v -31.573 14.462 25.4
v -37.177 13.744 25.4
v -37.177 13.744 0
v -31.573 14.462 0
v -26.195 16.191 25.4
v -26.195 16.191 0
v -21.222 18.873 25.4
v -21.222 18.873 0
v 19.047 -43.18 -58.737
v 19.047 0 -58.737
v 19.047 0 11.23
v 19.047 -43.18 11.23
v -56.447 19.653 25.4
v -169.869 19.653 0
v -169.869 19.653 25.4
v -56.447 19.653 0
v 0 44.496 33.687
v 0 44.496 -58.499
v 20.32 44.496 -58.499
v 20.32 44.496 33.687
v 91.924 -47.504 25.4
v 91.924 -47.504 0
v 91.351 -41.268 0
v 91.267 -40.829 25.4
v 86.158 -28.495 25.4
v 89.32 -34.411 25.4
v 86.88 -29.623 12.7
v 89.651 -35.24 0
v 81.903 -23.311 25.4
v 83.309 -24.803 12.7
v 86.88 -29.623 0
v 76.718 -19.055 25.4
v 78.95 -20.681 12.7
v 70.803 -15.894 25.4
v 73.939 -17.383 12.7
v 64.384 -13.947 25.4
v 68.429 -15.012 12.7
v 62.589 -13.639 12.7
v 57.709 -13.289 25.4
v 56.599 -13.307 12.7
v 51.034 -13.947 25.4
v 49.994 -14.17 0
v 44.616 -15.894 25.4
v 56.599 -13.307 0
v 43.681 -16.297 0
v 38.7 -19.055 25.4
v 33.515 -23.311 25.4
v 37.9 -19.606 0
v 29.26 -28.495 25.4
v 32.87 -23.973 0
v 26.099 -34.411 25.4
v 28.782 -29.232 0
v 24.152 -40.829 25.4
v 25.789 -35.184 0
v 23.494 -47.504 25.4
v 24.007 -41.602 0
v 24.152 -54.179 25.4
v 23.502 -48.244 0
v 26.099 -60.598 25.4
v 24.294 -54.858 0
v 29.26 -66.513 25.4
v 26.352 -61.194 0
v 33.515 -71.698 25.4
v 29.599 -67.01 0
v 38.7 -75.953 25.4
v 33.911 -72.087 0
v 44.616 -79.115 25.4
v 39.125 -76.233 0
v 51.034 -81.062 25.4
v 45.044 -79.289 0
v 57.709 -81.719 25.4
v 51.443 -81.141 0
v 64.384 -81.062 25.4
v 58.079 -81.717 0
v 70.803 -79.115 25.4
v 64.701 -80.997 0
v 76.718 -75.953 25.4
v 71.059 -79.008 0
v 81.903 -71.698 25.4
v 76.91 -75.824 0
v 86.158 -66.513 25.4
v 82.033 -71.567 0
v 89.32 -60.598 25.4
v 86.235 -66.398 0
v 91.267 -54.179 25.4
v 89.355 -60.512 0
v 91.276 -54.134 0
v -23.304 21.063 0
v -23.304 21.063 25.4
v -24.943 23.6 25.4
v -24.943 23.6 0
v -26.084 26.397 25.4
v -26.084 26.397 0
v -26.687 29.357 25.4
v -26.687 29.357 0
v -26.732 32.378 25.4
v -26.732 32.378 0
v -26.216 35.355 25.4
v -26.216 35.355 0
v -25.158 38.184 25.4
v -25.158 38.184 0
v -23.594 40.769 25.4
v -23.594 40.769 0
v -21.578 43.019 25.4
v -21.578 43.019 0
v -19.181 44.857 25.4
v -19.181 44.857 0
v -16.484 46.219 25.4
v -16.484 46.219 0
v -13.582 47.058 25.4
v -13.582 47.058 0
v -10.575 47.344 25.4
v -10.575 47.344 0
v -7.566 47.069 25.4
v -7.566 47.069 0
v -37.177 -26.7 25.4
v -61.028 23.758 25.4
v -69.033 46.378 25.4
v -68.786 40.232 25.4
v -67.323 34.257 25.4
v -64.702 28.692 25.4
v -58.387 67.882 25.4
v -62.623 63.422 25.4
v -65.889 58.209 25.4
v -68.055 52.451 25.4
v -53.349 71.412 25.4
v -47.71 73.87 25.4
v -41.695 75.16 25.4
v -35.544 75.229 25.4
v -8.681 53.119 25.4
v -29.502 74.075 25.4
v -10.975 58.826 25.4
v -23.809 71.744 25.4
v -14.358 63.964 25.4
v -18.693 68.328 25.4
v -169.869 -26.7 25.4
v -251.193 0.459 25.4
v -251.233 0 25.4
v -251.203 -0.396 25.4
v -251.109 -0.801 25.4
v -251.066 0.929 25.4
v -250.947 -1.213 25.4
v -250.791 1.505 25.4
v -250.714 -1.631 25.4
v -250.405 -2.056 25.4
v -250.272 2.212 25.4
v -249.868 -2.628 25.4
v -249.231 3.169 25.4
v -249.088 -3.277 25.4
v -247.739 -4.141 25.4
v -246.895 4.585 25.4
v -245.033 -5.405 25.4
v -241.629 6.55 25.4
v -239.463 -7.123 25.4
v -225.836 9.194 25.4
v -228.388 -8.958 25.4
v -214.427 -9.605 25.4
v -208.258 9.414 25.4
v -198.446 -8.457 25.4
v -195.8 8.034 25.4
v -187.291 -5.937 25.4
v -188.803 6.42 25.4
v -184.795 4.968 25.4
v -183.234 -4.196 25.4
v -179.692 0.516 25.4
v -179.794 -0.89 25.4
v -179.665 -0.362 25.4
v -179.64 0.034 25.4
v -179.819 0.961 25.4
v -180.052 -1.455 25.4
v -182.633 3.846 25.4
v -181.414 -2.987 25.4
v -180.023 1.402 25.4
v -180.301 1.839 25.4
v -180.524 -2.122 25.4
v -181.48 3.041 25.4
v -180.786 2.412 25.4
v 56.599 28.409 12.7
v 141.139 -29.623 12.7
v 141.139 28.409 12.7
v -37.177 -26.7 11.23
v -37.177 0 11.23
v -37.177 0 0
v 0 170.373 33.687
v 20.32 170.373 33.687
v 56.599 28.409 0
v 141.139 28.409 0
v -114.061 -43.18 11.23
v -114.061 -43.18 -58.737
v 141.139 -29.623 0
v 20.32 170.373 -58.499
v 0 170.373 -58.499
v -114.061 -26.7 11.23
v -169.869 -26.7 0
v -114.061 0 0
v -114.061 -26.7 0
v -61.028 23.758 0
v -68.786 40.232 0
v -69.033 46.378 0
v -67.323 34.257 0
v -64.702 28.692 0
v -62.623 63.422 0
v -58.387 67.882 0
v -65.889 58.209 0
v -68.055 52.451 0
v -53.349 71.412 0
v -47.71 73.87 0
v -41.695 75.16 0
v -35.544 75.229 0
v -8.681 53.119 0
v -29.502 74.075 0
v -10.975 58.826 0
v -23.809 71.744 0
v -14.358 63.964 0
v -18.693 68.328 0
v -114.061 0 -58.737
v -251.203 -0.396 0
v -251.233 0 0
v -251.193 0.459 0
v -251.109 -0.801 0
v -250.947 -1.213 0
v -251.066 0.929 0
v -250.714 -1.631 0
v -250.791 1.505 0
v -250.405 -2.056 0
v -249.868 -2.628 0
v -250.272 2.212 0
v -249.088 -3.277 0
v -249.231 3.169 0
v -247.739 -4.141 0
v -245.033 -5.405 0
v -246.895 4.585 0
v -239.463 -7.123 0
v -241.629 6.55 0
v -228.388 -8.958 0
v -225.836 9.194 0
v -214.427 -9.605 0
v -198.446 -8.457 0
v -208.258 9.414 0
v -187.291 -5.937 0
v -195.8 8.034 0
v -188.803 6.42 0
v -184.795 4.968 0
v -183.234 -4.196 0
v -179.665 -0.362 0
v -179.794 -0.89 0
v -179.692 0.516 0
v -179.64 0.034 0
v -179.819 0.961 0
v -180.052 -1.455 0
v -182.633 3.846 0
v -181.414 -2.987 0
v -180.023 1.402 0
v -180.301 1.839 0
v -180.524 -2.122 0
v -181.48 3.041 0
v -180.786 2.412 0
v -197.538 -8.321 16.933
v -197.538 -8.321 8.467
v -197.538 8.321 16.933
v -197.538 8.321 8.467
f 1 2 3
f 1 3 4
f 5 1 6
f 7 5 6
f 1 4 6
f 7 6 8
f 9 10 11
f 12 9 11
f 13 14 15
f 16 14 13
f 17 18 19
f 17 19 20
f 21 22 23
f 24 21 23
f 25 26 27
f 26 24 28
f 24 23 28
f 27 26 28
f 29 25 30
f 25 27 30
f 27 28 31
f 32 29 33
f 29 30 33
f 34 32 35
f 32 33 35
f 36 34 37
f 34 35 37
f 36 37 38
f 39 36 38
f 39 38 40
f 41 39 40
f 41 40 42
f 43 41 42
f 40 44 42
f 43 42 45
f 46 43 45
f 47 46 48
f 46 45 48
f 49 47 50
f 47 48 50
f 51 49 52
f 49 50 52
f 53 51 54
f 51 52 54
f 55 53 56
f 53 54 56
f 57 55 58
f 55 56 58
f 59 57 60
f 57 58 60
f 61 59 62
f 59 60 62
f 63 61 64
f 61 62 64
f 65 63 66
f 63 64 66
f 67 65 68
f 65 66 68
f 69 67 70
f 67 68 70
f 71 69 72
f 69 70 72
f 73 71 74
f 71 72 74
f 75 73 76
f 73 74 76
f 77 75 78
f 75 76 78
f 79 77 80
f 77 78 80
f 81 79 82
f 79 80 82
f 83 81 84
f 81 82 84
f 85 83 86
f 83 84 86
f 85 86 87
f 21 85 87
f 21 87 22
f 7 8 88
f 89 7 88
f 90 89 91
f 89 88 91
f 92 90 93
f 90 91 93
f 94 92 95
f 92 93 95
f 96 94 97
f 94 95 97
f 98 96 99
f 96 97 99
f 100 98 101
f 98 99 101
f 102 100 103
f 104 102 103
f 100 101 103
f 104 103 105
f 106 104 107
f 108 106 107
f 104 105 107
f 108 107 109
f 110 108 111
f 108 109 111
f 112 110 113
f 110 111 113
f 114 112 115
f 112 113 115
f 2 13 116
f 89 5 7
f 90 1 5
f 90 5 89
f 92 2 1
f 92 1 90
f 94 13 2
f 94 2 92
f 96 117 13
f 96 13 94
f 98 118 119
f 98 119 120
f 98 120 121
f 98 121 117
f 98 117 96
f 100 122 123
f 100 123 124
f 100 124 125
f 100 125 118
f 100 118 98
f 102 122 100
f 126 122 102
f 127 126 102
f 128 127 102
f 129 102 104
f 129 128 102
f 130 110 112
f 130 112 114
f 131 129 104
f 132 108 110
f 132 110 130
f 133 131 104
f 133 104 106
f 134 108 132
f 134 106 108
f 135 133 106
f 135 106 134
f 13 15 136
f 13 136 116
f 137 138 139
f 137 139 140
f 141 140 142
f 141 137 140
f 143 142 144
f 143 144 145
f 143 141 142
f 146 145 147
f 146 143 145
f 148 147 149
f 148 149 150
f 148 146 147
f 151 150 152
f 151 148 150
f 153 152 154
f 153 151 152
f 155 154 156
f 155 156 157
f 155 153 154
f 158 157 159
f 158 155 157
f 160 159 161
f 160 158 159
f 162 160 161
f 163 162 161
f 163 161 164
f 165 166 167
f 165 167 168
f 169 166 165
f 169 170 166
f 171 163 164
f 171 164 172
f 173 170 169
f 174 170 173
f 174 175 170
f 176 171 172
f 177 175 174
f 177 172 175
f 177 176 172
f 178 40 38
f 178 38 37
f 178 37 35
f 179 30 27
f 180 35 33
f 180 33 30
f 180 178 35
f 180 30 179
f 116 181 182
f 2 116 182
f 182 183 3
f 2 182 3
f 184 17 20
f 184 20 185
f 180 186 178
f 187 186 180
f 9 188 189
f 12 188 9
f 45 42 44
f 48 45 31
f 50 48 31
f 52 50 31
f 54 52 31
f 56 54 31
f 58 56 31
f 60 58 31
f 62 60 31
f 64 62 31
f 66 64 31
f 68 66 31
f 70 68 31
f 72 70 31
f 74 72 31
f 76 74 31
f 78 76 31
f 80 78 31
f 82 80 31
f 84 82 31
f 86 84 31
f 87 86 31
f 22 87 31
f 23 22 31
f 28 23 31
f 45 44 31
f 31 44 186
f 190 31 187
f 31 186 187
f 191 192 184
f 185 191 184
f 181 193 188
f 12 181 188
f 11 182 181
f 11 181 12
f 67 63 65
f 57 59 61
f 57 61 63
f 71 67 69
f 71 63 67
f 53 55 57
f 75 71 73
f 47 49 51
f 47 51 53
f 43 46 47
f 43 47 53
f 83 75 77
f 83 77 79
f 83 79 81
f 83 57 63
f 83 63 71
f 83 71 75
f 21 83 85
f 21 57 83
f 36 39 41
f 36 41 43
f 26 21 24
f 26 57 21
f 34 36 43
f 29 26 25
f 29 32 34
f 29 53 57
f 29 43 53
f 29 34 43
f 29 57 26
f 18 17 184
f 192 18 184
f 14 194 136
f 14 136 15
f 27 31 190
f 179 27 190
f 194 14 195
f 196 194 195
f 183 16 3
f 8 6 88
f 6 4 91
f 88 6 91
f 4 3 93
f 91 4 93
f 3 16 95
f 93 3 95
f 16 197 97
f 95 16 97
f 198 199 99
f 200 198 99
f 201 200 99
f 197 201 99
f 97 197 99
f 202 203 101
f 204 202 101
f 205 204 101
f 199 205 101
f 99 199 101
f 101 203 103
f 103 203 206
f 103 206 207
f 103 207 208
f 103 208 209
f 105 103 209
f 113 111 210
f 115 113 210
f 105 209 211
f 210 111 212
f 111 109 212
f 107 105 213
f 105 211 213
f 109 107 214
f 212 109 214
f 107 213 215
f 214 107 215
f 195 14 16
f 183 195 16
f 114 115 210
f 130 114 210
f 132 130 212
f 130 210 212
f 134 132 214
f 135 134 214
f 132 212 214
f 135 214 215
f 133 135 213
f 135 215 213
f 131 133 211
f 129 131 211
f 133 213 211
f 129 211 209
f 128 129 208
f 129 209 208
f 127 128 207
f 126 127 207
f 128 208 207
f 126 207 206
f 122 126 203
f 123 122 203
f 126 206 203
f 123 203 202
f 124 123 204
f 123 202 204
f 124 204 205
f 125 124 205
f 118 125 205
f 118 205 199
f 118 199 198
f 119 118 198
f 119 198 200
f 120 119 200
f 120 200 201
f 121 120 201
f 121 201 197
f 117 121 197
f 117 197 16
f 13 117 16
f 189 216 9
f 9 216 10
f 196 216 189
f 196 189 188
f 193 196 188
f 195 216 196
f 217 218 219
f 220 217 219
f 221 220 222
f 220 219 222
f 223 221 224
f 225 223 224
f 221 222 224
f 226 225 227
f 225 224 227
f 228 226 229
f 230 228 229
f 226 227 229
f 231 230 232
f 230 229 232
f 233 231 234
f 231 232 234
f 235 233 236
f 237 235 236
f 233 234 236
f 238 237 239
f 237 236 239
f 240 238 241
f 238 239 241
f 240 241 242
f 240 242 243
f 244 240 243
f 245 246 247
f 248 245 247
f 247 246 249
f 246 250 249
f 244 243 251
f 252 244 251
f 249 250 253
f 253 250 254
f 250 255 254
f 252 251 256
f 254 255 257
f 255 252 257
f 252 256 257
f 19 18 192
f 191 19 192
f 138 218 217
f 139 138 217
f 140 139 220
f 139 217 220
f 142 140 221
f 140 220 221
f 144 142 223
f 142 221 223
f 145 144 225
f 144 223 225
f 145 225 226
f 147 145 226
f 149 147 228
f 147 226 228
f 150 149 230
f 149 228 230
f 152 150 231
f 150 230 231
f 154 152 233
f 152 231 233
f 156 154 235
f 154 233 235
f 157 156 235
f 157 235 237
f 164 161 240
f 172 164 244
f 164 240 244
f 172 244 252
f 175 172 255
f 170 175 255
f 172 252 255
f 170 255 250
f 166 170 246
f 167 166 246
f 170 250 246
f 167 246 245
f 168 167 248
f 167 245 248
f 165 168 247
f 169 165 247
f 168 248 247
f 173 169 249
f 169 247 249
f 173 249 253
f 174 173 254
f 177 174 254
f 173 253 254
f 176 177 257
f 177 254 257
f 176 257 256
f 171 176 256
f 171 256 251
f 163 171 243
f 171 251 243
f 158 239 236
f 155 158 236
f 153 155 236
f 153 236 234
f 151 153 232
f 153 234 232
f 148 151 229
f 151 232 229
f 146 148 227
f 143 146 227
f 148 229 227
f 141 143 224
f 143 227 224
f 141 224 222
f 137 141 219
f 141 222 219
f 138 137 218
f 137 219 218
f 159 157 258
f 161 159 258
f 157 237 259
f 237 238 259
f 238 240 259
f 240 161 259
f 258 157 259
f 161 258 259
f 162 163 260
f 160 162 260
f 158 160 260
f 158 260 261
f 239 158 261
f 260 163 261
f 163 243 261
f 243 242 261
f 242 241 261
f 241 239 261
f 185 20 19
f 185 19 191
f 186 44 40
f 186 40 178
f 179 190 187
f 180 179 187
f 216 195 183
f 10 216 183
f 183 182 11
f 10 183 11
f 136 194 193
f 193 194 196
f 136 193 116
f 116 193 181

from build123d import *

# Parameters (mm, degrees)
F0_W      = 133.108183
F0_H      = 69.966845
F1_DEPTH  = 43.18
F2_W      = 84.539909
F2_H      = 58.032023
F3_DEPTH  = 12.7
F4_W      = 125.876807
F4_H      = 92.185639
F5_DEPTH  = 20.32
F6_W      = 132.691223
F6_H      = 46.35296
F7_DEPTH  = 25.4
F9_DEPTH  = 25.4
F10_R     = 34.215054
F11_DEPTH = 25.4
F13_DEPTH = 25.4


with BuildPart() as f1:
    # F0 (on Front) → F1 (new body)
    with BuildSketch(Plane.XZ):
        with Locations((-47.50736, -23.75368)):
            Rectangle(F0_W, F0_H)
    extrude(amount=F1_DEPTH)

    # F6 (on Top) → F7 (join)
    with BuildSketch(Plane.XY):
        with Locations((-103.522932, -3.523823)):
            Rectangle(F6_W, F6_H)
    extrude(amount=F7_DEPTH)

    # F8 (on Top) → F9 (join)
    with BuildSketch(Plane.XY):
        with BuildLine():
            ThreePointArc((-21.222473, 18.872858), (-25.15801, 38.184203), (-7.566157, 47.069203))
            ThreePointArc((-7.566157, 47.069203), (-66.006886, 57.96851), (-21.222473, 18.872858))
        make_face()
    extrude(amount=F9_DEPTH)


with BuildPart() as f3:
    # F2 (on Top) → F3 (new body)
    with BuildSketch(Plane.XY):
        with Locations((98.869239, -0.607235)):
            Rectangle(F2_W, F2_H)
    extrude(amount=F3_DEPTH)

    # F10 (on Top) → F11 (join)
    with BuildSketch(Plane.XY):
        with Locations((57.709131, -47.504254)):
            Circle(F10_R)
    extrude(amount=F11_DEPTH)


with BuildPart() as f5:
    # F4 (on Right) → F5 (new body)
    with BuildSketch(Plane.YZ):
        with Locations((107.434768, -12.406099)):
            Rectangle(F4_W, F4_H)
    extrude(amount=F5_DEPTH)


with BuildPart() as f13:
    # F12 (on Top) → F13 (new body)
    with BuildSketch(Plane.XY):
        with BuildLine():
            add(Edge.make_bspline(
                [(-251.233459, 0), (-251.233459, -16.642938), (-197.538249, -8.321469), (-143.84304, 0), (-197.538249, 8.321469), (-251.233459, 16.642938), (-251.233459, 0)],
                knots=[0, 0, 0, 2.094395, 2.094395, 4.18879, 4.18879, 6.283185, 6.283185, 6.283185], degree=2, weights=[1, 0.5, 1, 0.5, 1, 0.5, 1]))
        make_face()
    extrude(amount=F13_DEPTH)


solid = Compound([f1.part, f3.part, f5.part, f13.part])
